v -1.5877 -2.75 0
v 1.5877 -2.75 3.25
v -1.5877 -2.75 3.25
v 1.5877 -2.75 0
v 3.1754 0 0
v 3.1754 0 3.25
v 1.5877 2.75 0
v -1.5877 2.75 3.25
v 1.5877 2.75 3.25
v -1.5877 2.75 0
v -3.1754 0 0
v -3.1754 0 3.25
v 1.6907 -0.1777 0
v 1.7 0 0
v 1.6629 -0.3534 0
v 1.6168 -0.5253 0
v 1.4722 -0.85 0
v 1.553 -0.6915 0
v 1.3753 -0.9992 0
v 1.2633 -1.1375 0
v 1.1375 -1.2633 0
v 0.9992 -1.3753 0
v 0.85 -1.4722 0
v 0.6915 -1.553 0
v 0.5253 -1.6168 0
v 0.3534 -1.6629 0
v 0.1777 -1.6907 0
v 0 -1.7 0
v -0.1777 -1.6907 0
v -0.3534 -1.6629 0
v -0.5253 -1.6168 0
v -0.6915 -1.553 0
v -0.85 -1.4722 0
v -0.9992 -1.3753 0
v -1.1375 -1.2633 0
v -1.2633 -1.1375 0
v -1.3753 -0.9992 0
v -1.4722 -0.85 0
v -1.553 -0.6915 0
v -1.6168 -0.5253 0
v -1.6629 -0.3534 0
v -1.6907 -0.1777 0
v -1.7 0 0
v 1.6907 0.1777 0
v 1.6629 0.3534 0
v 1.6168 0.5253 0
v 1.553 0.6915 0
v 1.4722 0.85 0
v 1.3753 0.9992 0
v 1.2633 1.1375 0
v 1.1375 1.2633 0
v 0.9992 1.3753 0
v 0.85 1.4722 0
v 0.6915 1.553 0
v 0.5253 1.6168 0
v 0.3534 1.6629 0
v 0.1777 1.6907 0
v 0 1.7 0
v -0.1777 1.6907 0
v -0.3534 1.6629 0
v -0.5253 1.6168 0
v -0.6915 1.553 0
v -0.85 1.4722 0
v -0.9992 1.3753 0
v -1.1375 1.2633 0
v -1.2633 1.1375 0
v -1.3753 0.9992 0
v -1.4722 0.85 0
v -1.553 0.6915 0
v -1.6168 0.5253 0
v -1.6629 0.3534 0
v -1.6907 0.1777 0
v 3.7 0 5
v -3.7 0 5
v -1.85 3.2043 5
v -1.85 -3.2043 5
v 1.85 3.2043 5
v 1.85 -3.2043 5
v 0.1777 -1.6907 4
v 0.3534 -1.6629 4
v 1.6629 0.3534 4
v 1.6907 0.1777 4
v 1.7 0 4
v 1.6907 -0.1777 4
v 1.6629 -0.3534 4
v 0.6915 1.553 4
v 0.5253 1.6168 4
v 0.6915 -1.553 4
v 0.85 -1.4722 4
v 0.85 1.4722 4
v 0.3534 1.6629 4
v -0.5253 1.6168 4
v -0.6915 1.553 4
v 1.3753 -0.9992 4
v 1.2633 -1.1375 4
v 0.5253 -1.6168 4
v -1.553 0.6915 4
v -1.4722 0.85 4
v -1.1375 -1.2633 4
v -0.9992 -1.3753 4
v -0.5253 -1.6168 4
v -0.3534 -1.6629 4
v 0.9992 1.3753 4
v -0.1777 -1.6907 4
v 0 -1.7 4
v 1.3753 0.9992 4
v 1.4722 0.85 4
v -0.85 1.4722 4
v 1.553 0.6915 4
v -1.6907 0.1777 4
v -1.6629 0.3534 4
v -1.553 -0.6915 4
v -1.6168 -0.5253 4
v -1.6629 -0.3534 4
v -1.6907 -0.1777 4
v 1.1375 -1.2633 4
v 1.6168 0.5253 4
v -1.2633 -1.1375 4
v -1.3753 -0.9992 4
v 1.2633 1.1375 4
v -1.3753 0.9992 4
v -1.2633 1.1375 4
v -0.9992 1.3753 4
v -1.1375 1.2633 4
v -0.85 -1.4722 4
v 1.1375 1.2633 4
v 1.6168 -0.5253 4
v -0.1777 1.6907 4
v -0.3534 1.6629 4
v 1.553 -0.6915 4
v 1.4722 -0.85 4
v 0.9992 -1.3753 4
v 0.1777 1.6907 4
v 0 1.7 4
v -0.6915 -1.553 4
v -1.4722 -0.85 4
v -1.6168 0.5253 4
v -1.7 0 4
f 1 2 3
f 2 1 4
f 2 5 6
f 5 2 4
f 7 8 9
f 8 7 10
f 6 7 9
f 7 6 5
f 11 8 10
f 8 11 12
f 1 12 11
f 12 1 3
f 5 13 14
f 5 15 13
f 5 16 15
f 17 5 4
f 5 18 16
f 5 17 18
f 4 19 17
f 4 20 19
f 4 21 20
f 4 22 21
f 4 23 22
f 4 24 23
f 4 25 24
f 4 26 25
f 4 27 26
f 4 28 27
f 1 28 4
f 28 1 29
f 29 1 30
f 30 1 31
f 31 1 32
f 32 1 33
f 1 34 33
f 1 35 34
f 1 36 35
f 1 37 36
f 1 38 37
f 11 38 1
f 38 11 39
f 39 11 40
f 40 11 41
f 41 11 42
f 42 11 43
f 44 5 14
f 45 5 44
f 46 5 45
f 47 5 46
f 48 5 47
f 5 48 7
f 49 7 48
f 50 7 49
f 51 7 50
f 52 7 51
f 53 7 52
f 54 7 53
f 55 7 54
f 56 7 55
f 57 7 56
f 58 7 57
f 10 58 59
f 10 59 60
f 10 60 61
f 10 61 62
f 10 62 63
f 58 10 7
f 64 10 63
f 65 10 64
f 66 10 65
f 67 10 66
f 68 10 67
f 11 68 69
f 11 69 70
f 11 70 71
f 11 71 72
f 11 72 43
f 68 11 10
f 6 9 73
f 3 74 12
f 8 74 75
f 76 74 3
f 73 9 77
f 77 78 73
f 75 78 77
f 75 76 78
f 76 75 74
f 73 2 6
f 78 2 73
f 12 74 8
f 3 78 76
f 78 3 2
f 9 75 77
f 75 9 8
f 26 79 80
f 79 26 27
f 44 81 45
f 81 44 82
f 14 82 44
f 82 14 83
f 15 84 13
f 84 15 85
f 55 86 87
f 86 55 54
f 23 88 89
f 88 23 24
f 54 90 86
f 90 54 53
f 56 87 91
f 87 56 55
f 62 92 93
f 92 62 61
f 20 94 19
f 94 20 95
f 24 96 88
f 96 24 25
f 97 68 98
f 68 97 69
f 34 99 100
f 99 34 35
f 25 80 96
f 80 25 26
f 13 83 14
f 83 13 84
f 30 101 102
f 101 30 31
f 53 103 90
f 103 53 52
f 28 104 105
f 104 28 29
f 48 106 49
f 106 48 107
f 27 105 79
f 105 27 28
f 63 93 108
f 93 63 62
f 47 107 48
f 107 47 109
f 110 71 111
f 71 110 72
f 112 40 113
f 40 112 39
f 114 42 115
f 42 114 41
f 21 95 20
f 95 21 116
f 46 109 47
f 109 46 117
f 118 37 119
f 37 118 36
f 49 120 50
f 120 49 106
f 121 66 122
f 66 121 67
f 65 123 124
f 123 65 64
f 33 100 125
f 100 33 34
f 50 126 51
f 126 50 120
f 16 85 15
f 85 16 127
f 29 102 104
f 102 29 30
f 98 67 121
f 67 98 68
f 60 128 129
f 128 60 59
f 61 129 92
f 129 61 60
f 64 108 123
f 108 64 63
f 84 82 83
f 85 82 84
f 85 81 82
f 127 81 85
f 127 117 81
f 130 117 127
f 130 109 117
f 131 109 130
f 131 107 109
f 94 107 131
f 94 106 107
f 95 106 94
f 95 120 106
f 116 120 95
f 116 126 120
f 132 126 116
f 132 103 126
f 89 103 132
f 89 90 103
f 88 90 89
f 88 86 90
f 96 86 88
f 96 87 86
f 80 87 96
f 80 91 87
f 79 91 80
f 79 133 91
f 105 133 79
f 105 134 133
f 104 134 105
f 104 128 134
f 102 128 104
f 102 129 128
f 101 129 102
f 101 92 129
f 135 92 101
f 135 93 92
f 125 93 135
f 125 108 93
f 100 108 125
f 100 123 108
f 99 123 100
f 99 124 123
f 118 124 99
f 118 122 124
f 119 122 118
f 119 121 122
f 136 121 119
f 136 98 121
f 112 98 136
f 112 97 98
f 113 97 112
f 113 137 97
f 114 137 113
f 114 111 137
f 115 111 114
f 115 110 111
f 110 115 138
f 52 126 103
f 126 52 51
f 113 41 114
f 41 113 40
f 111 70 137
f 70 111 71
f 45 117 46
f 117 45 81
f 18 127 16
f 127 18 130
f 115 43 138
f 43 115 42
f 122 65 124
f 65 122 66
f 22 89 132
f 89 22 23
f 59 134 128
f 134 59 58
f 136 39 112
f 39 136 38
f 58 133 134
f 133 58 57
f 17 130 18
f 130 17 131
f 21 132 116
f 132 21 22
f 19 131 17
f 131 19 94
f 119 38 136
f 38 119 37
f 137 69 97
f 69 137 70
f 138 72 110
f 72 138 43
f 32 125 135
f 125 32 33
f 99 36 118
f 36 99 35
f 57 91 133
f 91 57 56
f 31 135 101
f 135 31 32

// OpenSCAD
// Blind cap nut.
$fn = 60;
eps = 0.02;
thread_d = 3.4;
flat = 5.5;
height = 5;
body_h = height*0.65;
difference() {
    union() {
        cylinder(d=flat/cos(30),h=body_h,$fn=6);
        translate([0,0,body_h]) cylinder(d1=flat/cos(30),d2=thread_d+4,h=height-body_h,$fn=6);
    }
    translate([0,0,-eps]) cylinder(d=thread_d,h=height-1+eps);
}
